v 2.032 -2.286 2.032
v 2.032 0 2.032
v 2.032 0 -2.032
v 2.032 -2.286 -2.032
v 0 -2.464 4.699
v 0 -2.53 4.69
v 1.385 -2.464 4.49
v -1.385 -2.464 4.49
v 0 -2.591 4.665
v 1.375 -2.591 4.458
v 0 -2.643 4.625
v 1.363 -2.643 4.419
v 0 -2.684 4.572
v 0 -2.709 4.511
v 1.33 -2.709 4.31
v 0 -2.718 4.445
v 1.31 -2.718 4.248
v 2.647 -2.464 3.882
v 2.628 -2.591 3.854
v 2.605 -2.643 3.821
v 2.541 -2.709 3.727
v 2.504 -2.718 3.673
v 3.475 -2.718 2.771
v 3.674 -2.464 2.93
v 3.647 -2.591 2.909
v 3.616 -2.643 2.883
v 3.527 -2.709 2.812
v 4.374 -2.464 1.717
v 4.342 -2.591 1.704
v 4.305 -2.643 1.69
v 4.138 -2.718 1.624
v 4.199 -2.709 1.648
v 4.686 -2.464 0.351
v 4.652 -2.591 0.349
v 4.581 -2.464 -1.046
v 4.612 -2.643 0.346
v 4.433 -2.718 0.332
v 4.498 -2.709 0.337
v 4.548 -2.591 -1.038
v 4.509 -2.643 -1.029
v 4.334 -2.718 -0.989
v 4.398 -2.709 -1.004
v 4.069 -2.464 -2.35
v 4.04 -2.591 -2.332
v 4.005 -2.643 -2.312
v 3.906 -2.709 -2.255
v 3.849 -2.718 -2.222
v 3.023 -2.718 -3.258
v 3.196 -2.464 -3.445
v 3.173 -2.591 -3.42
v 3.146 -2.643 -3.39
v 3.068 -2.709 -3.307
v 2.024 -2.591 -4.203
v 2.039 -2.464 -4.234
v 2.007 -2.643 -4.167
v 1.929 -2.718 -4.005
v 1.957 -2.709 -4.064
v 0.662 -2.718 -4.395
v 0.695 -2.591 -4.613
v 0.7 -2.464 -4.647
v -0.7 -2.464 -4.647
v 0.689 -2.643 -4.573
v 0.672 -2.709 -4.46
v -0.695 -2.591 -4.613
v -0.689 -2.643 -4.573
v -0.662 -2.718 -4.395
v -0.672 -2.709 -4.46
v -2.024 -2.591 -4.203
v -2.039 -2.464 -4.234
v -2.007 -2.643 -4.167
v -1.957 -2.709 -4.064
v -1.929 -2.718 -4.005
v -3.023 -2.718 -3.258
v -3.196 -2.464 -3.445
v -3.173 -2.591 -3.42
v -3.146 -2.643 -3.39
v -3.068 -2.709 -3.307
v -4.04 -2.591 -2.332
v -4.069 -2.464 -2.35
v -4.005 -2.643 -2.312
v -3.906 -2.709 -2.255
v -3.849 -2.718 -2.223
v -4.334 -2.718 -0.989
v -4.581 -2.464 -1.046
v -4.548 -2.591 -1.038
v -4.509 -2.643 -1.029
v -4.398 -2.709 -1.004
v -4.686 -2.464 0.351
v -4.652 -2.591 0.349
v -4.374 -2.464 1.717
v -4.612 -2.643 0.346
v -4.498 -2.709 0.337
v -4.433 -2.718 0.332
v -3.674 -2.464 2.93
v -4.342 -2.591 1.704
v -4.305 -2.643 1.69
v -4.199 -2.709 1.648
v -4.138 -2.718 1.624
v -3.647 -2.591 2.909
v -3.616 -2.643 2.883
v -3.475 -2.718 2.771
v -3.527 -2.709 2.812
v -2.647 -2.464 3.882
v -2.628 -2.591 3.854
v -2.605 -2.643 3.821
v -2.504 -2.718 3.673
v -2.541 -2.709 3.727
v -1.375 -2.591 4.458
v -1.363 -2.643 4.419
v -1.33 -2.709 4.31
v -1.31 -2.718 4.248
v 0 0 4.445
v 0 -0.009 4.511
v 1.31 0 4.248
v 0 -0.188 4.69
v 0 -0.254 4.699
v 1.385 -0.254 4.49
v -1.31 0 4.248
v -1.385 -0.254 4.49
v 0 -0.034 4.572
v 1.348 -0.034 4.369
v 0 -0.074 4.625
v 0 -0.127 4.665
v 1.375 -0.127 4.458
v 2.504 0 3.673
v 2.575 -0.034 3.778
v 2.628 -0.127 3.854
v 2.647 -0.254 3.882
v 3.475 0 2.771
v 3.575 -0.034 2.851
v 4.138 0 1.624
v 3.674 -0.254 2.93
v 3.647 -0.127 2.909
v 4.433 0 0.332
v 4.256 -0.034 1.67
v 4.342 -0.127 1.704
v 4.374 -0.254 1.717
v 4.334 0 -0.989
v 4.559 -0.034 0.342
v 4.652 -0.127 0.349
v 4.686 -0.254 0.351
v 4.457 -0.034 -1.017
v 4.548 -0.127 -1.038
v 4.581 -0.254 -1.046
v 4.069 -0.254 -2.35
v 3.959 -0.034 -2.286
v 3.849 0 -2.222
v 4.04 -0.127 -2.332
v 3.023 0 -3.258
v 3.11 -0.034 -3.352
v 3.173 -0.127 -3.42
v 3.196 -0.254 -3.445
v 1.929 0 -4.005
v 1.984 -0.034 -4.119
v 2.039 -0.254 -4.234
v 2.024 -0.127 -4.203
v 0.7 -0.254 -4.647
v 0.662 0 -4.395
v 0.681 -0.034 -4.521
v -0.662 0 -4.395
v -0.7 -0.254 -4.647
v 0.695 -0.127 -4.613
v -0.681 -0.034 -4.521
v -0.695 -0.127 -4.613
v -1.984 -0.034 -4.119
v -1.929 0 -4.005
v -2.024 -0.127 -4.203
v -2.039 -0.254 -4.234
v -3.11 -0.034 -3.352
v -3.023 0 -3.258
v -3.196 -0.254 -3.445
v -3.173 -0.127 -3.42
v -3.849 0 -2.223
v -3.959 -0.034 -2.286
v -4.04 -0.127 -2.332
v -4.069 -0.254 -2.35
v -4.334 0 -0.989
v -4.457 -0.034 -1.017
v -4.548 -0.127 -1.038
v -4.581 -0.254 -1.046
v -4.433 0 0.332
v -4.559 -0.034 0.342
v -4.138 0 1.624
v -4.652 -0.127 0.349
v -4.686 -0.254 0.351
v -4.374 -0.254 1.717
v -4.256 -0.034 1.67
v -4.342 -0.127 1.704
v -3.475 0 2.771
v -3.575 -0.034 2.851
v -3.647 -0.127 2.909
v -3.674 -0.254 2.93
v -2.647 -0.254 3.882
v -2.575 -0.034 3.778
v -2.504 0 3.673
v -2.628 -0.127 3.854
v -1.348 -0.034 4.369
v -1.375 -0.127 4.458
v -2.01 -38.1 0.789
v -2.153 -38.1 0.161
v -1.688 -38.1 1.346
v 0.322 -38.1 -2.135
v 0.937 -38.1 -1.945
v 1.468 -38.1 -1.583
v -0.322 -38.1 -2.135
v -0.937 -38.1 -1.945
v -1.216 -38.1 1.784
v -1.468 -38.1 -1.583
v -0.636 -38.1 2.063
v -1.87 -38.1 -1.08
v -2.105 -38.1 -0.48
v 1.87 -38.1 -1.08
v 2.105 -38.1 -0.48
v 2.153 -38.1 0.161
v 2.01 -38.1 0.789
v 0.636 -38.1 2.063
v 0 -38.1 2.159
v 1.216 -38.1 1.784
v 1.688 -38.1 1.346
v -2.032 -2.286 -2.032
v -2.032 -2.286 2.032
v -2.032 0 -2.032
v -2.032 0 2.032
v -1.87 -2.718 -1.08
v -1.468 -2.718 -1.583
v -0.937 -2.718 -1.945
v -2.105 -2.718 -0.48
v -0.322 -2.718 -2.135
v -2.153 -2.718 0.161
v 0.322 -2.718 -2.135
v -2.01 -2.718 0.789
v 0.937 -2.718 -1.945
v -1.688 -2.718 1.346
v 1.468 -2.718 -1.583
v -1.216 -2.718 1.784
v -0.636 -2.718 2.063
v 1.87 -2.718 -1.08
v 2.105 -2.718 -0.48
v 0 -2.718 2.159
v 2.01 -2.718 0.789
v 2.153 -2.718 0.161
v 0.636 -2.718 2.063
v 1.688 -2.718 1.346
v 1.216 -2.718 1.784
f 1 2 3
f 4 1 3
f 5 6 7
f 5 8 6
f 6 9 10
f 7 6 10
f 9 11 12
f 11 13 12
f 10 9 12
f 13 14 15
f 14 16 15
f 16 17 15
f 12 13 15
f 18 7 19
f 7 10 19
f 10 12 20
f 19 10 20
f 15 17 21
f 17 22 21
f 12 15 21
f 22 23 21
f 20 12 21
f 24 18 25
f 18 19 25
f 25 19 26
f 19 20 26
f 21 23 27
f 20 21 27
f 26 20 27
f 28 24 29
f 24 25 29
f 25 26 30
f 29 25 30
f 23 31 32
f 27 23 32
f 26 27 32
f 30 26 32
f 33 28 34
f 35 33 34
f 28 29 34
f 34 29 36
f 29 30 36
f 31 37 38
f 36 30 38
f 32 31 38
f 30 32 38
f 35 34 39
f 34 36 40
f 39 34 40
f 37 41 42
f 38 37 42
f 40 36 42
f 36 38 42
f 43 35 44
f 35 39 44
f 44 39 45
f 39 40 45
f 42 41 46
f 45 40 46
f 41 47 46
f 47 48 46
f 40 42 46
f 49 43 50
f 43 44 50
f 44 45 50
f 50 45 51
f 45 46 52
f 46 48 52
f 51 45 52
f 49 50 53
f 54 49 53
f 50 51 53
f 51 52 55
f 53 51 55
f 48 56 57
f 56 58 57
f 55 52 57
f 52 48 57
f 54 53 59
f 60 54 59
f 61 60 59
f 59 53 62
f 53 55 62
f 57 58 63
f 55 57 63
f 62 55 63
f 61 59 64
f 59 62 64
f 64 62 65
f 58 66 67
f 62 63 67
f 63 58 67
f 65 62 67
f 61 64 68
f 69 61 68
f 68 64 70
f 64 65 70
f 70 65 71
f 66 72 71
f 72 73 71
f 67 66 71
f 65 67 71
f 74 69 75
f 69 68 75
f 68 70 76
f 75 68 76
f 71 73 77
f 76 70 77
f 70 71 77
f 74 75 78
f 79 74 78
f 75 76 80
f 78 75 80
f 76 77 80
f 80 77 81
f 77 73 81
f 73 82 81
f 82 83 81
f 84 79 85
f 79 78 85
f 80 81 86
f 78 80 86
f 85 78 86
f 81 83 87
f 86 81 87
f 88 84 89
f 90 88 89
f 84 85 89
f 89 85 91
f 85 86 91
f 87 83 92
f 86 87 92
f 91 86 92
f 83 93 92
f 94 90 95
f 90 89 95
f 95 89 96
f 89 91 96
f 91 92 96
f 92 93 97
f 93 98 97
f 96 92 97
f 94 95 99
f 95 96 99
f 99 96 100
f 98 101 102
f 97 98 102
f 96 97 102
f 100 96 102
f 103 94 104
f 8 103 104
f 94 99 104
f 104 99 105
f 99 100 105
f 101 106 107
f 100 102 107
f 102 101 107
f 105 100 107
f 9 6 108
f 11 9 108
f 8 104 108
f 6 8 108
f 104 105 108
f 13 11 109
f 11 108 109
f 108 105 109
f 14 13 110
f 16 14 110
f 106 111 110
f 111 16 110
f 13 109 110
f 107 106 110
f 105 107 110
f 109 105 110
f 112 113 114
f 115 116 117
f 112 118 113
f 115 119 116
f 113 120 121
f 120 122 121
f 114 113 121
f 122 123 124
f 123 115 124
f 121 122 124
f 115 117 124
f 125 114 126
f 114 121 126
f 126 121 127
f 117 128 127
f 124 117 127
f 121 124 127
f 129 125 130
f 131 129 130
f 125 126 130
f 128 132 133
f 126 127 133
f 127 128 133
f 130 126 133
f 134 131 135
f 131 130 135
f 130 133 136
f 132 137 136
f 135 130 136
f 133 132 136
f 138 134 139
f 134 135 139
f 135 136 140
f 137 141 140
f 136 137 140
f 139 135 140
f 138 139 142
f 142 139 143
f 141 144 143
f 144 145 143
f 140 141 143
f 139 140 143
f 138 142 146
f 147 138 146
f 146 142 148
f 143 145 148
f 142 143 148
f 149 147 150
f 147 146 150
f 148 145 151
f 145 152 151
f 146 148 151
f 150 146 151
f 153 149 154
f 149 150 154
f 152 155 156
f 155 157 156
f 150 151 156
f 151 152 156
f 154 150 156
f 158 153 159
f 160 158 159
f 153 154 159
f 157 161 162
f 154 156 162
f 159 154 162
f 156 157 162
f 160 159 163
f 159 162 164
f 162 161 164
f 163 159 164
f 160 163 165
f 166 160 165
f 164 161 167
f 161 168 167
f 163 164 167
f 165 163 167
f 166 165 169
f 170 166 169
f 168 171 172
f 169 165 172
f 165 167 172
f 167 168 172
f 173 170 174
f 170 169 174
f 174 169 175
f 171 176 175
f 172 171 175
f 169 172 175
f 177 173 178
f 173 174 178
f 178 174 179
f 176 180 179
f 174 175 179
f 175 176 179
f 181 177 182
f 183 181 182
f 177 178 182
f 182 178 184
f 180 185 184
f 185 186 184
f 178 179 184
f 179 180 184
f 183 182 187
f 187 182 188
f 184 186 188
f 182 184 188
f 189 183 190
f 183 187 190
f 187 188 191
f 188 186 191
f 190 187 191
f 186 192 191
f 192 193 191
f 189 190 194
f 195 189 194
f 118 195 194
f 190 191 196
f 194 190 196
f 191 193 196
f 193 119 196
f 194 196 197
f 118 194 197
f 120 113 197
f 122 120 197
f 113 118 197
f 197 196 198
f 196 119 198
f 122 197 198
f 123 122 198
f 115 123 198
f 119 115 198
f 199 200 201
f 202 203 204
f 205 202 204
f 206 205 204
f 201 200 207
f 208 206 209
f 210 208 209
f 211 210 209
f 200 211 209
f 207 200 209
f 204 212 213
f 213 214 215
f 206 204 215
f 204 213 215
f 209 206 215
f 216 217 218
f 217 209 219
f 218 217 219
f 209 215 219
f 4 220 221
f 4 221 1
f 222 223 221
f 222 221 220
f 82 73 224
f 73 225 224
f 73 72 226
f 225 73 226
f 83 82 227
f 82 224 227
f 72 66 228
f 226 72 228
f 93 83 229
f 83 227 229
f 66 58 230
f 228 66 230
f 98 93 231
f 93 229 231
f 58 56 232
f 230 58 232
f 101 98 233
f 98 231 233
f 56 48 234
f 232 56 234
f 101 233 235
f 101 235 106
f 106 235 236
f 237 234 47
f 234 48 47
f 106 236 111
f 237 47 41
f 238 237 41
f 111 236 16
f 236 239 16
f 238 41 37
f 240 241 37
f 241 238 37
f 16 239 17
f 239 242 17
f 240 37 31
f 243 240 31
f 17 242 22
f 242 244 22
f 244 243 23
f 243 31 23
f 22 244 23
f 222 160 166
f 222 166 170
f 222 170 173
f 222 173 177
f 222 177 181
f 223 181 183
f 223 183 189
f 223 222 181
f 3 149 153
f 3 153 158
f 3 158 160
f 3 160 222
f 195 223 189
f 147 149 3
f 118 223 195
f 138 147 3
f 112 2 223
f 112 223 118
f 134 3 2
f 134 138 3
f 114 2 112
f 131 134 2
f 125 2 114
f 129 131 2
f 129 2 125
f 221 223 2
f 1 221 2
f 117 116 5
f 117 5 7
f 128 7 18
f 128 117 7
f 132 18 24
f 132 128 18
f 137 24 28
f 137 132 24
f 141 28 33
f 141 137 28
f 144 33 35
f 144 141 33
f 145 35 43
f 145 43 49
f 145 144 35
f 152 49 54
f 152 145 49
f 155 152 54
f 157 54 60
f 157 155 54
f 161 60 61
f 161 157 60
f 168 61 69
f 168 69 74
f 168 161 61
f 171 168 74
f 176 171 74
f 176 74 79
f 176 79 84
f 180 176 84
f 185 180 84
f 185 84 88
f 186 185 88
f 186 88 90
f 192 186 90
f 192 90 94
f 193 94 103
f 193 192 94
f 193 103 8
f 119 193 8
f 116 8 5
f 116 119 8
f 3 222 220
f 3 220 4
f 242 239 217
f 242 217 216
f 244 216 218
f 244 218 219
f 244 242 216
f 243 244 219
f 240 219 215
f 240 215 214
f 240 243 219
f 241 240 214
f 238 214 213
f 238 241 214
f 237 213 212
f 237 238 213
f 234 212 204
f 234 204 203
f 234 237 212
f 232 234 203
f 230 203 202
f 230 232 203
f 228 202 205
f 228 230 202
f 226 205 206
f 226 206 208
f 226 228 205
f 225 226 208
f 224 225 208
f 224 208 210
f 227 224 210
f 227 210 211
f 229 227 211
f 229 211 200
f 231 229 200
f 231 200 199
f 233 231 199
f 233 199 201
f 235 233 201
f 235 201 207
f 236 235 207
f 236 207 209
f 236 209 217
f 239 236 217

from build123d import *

# Parameters (mm, degrees)
SKETCH1_R           = 4.699
BOSS_EXTRUDE1_DEPTH = 2.7178
SKETCH2_R           = 2.159
BOSS_EXTRUDE2_DEPTH = 38.1
SKETCH3_W           = 4.064
SKETCH3_H           = 4.064
CUT_EXTRUDE1_DEPTH  = 2.286
FILLET2_R           = 0.254


with BuildPart() as part:
    # Sketch1 → Boss-Extrude1 (new body)
    with BuildSketch(Plane(origin=(0, 0, 0), x_dir=(1, 0, 0), z_dir=(0, 1, 0))):
        with Locations(Location((0, 0, 0), (0, 0, 270))):
            Circle(SKETCH1_R)
    extrude(amount=-BOSS_EXTRUDE1_DEPTH)

    # Sketch2 → Boss-Extrude2 (add)
    with BuildSketch(Plane(origin=(0, 0, 0), x_dir=(1, 0, 0), z_dir=(0, 1, 0))):
        with Locations(Location((0, 0, 0), (0, 0, 270))):
            Circle(SKETCH2_R)
    extrude(amount=-BOSS_EXTRUDE2_DEPTH)

    # Sketch3 → Cut-Extrude1 (cut)
    with BuildSketch(Plane(origin=(0, 0, 0), x_dir=(1, 0, 0), z_dir=(0, 1, 0))):
        Rectangle(SKETCH3_W, SKETCH3_H)
    extrude(amount=-CUT_EXTRUDE1_DEPTH, mode=Mode.SUBTRACT)

    # Fillet2
    fillet2_edges = [part.edges().sort_by_distance(p)[0] for p in [
        (0, 0, -4.699),
        (0, -2.7178, -4.699),
    ]]
    fillet(fillet2_edges, radius=FILLET2_R)


solid = part.part
